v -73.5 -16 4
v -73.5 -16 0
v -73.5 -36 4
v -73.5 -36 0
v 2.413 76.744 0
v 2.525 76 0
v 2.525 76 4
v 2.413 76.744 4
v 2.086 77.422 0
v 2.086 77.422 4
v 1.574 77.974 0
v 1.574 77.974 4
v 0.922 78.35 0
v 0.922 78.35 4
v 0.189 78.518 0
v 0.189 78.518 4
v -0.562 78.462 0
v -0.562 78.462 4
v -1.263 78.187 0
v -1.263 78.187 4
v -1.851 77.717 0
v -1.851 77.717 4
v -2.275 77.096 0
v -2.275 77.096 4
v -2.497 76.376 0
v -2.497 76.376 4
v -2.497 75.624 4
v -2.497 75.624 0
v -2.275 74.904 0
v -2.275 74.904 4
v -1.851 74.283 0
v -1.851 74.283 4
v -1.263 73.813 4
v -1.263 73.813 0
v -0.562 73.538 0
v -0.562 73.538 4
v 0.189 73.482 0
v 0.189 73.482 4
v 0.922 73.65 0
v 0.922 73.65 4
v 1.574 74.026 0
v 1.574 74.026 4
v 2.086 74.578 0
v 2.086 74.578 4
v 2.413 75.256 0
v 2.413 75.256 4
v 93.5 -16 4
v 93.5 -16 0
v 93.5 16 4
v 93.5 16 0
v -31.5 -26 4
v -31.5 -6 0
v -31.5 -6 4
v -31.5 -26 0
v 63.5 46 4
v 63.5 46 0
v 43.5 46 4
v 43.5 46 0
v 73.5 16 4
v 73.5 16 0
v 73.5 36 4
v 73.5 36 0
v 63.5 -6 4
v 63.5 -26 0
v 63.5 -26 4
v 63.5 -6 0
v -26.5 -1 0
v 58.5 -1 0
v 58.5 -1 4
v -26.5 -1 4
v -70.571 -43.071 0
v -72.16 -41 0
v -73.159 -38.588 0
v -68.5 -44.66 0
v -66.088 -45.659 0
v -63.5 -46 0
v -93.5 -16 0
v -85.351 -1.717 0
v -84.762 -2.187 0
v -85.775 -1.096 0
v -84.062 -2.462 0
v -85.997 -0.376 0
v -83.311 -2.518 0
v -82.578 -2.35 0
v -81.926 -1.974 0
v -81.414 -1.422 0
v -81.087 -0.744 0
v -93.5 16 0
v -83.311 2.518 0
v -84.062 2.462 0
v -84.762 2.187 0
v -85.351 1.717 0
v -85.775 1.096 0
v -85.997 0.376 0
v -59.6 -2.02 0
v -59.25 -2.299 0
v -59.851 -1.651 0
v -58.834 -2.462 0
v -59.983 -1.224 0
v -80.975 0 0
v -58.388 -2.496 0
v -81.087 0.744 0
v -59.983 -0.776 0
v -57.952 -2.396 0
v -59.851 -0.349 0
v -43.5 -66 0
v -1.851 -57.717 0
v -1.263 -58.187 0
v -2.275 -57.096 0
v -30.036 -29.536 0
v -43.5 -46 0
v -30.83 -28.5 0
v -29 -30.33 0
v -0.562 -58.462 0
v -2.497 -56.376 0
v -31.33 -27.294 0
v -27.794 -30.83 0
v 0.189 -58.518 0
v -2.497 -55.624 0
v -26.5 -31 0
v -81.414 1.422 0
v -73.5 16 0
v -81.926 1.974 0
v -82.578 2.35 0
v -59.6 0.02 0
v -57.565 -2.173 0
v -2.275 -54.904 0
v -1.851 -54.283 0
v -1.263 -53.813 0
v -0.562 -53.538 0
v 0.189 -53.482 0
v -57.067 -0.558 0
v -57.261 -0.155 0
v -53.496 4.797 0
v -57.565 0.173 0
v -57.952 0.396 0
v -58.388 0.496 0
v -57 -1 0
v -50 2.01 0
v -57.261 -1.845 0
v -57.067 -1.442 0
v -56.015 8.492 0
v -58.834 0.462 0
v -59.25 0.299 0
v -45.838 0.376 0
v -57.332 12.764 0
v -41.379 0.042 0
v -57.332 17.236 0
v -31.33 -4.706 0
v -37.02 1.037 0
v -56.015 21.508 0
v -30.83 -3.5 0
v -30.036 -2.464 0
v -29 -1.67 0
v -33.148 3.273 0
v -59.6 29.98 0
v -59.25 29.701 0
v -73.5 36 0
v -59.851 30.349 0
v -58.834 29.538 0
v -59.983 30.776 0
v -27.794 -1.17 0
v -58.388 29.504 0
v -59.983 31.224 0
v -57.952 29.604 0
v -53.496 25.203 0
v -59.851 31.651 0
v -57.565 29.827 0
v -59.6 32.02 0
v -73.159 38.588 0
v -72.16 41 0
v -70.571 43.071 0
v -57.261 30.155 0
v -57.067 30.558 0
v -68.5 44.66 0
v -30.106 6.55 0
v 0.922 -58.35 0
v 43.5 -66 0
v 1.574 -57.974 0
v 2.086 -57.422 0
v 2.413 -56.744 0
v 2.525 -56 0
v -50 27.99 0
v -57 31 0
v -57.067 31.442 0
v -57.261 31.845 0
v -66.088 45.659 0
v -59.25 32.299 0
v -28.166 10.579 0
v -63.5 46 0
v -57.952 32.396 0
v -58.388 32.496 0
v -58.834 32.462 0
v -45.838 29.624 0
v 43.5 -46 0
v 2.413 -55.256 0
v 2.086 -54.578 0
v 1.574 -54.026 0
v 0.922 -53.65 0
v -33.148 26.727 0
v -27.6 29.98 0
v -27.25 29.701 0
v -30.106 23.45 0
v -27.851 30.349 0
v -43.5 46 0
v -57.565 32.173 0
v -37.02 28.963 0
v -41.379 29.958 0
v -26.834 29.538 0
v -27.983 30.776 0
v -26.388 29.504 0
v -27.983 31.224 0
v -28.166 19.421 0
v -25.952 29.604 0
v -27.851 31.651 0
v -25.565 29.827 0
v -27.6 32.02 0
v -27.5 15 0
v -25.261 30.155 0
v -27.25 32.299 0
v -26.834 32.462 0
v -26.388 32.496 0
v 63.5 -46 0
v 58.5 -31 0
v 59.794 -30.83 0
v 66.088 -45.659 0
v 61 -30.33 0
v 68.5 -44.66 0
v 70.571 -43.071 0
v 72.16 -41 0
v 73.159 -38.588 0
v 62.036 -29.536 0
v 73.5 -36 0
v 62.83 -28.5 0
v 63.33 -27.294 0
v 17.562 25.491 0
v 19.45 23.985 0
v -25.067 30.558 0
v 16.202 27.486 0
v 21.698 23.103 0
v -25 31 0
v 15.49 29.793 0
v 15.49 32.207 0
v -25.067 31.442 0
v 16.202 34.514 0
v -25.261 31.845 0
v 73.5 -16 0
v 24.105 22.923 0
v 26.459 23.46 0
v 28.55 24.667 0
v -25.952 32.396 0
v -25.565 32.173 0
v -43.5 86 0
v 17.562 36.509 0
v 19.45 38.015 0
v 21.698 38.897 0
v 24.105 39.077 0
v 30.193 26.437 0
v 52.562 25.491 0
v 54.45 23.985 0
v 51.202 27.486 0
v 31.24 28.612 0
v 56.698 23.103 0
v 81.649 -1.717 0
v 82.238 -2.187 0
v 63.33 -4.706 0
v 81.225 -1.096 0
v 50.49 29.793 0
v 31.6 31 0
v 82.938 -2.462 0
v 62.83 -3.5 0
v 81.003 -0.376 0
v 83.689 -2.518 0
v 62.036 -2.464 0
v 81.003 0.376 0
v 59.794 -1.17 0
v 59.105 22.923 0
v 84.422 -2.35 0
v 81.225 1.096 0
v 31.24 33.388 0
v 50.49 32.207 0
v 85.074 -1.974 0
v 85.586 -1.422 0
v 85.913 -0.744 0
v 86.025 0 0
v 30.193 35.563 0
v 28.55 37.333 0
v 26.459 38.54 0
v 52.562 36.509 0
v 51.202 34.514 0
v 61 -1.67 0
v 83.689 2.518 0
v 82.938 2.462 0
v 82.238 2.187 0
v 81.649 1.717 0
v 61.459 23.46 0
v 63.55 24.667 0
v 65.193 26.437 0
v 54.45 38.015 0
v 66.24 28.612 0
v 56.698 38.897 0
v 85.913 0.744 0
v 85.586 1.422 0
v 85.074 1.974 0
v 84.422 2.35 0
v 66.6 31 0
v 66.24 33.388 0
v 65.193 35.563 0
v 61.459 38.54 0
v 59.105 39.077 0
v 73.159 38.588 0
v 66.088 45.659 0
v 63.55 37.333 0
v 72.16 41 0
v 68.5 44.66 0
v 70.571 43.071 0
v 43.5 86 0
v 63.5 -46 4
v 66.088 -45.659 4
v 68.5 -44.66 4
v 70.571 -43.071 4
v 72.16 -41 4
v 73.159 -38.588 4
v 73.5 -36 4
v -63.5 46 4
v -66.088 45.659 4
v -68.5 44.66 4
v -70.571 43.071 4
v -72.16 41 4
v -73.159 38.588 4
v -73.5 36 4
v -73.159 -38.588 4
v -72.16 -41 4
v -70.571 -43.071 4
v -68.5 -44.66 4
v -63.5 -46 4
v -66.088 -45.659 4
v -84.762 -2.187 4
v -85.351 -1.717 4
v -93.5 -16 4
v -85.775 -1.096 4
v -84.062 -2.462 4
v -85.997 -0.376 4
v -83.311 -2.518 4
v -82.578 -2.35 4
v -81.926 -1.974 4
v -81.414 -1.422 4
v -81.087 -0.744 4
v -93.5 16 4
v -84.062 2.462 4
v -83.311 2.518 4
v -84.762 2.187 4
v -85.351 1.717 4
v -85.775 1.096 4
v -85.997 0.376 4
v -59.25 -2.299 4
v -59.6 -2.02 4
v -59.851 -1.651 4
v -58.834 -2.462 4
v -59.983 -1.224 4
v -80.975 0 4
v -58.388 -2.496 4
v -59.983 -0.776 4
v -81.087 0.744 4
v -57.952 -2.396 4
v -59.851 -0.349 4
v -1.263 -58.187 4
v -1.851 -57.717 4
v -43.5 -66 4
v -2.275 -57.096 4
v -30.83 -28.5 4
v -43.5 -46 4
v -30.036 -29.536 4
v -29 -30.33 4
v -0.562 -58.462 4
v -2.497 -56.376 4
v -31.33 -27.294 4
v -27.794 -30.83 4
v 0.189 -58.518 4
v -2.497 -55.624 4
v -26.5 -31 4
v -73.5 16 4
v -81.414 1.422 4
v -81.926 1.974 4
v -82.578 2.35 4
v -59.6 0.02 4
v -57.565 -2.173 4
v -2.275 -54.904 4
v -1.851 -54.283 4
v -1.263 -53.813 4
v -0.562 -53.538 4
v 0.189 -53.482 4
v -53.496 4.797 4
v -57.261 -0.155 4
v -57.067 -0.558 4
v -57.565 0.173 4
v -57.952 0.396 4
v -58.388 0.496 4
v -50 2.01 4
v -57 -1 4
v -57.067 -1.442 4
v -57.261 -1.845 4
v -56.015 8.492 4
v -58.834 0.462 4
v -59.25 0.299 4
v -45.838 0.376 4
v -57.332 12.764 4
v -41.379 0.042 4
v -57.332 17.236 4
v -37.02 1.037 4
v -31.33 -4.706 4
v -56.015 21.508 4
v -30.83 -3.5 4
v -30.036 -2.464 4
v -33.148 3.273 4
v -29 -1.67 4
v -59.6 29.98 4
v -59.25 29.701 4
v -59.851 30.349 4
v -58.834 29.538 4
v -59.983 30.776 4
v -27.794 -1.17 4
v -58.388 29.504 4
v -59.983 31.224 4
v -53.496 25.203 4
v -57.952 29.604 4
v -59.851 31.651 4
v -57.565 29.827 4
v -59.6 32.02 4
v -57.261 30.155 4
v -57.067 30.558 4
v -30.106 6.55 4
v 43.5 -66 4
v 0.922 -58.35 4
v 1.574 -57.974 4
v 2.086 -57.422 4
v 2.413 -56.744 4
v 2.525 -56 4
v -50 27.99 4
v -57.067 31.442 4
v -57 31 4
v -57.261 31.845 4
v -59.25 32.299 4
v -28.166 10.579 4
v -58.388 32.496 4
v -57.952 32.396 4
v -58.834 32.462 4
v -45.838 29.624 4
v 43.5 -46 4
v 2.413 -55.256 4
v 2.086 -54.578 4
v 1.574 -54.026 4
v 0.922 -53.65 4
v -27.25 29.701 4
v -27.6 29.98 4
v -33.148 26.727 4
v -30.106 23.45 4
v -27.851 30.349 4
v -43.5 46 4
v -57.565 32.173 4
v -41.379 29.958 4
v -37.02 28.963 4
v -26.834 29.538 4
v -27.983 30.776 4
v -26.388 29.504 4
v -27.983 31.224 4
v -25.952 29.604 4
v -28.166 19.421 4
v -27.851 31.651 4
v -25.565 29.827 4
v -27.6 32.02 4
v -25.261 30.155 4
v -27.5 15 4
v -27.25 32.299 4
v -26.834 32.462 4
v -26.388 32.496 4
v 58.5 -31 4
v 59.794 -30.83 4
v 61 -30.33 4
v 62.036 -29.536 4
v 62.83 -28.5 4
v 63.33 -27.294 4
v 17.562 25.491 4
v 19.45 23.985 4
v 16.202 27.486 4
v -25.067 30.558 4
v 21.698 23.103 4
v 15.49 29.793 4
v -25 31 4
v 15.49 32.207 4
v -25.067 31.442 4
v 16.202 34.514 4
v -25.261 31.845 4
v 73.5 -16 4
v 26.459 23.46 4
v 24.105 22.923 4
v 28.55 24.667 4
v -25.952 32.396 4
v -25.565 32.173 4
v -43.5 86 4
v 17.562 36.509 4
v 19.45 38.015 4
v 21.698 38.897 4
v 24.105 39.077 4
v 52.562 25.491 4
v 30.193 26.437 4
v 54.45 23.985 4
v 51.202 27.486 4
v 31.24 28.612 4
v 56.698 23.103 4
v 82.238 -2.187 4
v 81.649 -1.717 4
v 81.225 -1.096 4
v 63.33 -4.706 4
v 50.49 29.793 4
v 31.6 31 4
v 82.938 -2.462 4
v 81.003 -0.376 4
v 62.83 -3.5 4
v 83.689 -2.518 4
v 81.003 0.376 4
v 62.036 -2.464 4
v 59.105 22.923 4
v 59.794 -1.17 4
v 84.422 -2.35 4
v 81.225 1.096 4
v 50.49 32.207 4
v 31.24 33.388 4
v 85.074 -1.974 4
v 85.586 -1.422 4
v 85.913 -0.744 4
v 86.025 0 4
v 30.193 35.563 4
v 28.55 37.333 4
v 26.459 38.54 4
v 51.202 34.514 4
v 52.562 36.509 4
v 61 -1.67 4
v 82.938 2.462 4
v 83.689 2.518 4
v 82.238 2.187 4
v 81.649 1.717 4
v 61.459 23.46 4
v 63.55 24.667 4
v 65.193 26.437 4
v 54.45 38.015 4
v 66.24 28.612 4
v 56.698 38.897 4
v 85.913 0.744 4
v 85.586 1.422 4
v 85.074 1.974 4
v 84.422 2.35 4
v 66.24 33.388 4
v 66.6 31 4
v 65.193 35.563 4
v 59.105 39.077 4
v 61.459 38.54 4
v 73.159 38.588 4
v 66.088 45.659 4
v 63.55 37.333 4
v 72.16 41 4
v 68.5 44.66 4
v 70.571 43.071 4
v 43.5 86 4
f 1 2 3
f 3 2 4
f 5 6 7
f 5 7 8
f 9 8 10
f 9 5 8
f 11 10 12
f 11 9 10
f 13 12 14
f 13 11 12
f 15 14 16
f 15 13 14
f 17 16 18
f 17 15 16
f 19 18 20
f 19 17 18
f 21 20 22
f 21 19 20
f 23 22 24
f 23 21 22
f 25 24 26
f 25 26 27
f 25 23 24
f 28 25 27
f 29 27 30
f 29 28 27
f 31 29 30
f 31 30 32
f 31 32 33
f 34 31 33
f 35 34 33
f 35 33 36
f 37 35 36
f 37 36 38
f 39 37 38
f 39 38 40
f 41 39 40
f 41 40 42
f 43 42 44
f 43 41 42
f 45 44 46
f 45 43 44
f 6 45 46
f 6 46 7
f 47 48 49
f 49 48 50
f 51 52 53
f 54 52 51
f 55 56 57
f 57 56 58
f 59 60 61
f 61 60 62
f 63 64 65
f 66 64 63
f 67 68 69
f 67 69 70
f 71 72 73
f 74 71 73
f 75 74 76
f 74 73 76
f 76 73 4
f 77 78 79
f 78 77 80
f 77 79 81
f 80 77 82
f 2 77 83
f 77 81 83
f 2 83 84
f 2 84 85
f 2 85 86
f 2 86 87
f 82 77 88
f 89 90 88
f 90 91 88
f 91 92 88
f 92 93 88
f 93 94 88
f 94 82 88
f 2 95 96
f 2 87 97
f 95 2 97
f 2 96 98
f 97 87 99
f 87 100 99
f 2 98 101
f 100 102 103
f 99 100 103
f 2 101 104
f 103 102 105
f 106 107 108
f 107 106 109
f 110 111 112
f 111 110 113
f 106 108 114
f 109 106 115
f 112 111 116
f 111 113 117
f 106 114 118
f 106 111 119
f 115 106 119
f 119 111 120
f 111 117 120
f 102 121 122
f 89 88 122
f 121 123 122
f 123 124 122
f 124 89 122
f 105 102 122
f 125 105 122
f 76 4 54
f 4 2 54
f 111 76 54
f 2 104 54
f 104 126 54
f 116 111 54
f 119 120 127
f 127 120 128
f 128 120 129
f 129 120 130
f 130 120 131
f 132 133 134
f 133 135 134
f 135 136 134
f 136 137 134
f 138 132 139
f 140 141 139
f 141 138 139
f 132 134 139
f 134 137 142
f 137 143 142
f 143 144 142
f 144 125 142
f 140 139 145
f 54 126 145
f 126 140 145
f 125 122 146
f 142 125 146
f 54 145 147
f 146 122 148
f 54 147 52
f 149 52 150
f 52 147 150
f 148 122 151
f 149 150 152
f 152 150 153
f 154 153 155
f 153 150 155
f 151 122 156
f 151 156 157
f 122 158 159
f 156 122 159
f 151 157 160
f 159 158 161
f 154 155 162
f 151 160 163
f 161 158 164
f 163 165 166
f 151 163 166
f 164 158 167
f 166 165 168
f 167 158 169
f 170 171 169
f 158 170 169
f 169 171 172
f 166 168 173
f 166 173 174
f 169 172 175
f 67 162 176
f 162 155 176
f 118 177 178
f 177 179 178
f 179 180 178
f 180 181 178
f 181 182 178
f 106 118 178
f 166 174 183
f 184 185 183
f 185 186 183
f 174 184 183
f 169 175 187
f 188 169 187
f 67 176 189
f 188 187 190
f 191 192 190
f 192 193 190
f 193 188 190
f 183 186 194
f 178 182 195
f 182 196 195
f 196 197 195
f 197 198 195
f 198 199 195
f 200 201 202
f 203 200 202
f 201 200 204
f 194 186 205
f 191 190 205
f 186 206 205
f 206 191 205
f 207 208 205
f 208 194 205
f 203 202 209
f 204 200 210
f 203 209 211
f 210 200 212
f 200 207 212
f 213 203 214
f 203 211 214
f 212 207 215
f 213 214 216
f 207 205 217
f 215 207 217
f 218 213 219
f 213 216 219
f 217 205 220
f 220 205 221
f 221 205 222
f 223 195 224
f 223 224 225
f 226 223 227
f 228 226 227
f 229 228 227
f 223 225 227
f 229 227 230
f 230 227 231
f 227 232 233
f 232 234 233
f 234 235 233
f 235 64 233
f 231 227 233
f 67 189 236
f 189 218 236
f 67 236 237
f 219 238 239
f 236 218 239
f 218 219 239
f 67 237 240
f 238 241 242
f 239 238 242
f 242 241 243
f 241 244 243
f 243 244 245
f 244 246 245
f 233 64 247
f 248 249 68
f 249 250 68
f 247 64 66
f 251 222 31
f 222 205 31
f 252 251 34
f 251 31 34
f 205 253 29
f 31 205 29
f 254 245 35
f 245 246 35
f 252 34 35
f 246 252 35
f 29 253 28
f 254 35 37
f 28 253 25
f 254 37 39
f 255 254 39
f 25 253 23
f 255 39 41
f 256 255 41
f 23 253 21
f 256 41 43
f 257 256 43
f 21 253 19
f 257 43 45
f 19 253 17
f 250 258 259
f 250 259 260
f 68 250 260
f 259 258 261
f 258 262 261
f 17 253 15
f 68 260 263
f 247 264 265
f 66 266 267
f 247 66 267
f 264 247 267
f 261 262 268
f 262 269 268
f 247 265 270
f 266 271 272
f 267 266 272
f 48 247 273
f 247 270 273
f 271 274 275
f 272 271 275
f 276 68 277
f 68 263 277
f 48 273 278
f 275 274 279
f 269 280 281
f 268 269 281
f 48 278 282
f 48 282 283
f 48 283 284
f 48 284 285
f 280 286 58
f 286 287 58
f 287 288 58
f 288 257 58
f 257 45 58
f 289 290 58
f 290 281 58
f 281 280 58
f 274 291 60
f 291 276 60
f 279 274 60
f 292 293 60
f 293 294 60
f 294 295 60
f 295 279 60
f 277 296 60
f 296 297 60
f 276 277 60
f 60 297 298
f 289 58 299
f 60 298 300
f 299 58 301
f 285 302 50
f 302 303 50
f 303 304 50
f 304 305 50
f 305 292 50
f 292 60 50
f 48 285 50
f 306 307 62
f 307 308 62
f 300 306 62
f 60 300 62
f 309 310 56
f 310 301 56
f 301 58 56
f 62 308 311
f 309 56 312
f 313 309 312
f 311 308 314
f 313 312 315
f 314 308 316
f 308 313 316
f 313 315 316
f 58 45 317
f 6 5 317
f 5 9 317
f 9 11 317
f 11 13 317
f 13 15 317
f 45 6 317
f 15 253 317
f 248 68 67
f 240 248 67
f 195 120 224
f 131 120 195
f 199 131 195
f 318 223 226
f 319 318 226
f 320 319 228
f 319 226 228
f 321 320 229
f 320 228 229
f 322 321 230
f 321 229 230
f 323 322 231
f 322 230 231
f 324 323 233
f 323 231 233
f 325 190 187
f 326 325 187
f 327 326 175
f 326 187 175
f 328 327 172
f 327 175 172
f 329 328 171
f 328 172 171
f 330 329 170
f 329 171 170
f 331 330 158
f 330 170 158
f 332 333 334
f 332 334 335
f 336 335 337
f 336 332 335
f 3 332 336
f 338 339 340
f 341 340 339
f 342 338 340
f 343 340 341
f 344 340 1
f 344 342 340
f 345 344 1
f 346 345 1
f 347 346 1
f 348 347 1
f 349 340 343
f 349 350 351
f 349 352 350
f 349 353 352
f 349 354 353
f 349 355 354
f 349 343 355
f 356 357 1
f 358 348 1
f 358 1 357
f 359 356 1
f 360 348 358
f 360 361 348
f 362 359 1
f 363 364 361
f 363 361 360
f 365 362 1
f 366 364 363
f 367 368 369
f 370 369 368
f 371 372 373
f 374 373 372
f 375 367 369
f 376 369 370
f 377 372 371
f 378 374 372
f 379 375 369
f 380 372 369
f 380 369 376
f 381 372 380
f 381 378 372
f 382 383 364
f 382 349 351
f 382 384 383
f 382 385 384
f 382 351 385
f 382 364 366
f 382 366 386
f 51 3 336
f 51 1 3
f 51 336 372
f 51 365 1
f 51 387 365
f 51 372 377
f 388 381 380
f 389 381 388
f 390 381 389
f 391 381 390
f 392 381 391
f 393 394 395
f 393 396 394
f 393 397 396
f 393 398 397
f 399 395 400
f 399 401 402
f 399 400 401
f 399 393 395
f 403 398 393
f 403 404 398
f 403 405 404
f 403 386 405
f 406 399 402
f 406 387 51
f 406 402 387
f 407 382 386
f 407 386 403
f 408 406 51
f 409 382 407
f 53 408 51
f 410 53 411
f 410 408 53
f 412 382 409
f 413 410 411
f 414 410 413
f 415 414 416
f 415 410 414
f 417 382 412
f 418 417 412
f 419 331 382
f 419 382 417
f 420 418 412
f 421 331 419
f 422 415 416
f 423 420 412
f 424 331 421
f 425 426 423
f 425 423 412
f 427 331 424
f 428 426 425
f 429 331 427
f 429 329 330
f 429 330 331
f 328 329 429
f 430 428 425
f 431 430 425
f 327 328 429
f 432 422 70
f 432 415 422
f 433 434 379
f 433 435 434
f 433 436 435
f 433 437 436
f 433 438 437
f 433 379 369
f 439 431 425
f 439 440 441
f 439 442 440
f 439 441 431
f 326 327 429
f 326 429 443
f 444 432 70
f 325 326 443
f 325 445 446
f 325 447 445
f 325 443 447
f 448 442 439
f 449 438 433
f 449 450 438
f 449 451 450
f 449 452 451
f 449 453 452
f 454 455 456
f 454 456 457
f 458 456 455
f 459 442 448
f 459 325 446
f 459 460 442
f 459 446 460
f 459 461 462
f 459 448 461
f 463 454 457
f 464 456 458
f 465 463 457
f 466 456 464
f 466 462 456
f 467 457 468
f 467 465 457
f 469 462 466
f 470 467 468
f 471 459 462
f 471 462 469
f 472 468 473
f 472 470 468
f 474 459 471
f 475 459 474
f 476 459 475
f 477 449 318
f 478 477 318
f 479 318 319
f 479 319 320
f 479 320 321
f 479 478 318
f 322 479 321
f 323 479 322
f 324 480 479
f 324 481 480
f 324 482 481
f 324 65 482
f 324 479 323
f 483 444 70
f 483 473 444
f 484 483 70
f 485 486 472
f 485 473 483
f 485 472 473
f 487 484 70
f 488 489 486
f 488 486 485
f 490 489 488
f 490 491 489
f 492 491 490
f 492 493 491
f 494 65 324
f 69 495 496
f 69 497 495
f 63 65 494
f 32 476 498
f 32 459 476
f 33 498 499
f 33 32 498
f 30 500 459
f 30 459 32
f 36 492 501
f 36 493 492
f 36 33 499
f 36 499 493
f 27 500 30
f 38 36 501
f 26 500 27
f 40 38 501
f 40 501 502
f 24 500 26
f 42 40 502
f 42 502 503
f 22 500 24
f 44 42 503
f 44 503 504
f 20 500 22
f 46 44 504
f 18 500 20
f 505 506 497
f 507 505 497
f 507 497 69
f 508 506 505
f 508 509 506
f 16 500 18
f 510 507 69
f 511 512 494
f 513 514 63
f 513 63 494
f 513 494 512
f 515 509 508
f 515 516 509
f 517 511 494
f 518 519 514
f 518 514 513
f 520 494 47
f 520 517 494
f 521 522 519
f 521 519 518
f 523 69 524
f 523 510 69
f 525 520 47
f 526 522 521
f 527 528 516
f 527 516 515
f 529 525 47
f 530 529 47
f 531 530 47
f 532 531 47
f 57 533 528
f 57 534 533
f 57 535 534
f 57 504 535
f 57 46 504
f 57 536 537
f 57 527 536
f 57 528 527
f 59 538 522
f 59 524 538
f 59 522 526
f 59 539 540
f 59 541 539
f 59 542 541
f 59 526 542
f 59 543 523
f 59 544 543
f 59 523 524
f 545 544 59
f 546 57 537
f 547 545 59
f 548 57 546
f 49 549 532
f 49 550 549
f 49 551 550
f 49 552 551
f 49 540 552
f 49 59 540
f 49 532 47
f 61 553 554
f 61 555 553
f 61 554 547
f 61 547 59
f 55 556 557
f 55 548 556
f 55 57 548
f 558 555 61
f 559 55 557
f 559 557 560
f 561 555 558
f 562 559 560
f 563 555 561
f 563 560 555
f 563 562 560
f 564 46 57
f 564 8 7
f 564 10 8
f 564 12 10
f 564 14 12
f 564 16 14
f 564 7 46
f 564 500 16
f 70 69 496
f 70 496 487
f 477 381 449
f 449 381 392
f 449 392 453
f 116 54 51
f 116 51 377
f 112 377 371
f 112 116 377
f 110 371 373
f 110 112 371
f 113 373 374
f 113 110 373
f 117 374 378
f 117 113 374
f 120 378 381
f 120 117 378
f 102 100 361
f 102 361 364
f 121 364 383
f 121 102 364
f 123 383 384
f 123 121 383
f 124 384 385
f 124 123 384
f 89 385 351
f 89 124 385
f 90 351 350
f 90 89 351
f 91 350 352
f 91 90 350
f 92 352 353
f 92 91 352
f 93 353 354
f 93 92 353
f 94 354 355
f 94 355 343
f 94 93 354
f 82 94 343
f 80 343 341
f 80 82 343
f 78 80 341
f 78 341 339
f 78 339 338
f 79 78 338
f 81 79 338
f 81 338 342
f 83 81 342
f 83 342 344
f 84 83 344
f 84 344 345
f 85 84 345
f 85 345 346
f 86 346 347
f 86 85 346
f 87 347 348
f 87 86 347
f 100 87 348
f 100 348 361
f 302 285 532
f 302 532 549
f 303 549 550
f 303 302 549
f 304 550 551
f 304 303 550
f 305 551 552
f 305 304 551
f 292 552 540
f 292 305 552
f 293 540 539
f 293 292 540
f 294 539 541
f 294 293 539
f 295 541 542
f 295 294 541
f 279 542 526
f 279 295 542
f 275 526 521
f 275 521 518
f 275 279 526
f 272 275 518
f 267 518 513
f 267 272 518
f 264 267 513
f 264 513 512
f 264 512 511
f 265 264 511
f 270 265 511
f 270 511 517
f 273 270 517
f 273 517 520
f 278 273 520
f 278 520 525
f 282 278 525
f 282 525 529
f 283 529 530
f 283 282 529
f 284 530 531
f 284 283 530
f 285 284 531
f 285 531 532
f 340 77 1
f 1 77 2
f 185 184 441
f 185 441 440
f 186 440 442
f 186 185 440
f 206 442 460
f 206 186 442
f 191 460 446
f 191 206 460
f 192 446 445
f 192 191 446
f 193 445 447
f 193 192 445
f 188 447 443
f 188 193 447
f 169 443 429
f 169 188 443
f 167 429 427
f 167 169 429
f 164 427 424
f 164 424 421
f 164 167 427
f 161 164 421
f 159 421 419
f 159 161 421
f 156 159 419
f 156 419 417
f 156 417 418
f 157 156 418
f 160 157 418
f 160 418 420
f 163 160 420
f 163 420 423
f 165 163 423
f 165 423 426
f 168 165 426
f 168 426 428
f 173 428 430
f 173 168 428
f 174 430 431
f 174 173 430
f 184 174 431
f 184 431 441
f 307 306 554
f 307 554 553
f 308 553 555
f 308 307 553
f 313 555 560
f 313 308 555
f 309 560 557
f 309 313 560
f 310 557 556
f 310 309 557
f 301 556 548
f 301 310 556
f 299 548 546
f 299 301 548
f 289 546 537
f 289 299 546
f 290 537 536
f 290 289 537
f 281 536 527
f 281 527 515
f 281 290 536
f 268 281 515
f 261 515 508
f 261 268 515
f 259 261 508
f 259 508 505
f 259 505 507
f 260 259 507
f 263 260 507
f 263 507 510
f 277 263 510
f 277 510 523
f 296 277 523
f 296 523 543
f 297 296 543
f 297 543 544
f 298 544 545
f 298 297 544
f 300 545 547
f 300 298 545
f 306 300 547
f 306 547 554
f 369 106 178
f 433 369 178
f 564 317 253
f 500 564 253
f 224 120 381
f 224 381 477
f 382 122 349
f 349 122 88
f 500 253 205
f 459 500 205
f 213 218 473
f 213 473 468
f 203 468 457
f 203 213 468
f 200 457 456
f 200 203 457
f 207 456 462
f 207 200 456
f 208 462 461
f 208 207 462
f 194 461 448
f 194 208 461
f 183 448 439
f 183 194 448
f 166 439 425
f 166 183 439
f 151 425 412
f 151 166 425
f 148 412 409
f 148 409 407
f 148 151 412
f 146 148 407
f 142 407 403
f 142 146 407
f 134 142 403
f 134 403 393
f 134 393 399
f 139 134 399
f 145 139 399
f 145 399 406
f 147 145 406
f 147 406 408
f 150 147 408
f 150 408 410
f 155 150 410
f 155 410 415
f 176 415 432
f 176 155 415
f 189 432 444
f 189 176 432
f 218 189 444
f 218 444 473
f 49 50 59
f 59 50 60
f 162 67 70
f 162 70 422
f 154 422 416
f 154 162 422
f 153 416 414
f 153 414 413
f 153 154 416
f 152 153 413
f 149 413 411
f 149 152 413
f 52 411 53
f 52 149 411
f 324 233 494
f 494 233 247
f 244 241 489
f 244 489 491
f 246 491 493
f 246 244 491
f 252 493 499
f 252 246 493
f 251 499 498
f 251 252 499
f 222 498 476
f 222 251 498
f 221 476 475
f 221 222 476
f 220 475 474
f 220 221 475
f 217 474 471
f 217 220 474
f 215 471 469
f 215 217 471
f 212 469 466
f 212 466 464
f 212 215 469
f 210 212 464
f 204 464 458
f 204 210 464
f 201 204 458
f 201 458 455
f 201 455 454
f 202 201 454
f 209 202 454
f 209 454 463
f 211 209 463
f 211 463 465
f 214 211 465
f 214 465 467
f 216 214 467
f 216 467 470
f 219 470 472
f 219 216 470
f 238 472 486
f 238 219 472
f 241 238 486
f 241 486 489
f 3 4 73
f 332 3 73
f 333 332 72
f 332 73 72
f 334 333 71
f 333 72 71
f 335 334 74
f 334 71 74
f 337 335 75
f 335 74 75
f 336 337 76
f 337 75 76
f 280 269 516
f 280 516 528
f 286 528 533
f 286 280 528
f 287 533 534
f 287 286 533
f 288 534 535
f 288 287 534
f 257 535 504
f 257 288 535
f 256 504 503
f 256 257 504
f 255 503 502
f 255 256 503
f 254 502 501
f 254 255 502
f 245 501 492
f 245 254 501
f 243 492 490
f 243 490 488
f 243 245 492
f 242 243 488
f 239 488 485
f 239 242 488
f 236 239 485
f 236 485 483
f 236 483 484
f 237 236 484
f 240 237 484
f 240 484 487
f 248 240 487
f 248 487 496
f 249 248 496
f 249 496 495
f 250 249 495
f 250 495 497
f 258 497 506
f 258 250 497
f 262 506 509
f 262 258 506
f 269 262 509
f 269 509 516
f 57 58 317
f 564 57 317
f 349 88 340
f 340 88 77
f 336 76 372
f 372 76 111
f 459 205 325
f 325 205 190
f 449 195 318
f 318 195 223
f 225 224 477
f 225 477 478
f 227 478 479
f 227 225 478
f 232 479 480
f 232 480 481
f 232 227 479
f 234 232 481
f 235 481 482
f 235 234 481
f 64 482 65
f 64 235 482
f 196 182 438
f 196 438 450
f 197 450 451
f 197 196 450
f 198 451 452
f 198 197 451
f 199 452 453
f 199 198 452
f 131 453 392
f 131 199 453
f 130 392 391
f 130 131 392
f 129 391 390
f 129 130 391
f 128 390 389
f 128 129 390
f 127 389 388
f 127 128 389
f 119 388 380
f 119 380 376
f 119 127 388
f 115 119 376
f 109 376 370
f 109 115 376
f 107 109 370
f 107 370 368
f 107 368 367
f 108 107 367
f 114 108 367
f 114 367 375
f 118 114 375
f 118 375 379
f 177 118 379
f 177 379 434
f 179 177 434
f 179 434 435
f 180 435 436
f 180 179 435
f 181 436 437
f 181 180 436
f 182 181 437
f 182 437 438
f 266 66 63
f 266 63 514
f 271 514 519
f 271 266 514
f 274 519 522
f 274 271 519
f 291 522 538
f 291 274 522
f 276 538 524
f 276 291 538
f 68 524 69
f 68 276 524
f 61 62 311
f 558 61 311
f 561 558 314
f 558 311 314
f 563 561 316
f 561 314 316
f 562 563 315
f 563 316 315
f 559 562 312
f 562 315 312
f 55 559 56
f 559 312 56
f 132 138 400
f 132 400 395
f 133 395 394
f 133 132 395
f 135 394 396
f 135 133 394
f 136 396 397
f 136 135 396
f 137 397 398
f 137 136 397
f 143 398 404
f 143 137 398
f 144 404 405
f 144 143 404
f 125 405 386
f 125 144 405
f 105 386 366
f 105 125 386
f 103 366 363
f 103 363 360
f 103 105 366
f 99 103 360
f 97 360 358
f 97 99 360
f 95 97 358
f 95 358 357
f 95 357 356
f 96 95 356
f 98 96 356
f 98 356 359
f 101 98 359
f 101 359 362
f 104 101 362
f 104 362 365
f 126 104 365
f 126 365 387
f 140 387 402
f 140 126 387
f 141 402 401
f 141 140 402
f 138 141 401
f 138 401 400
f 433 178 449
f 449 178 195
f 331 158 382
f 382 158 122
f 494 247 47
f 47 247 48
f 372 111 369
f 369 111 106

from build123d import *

# Parameters (mm, degrees)
MODEL_R             = 8.1
MODEL_R_2           = 1.5
MODEL_R_3           = 2.525
MODEL_R_4           = 15
BOSS_EXTRUDE1_DEPTH = 4


with BuildPart() as part:
    # Model → Boss-Extrude1 (new body)
    with BuildSketch(Plane.XY):
        with BuildLine():
            Line((-93.5, -16), (-73.5, -16))
            Line((-73.5, -16), (-73.5, -36))
            ThreePointArc((-73.5, -36), (-70.571067812, -43.071067812), (-63.5, -46))
            Line((-63.5, -46), (-43.5, -46))
            Line((-43.5, -46), (-43.5, -66))
            Line((-43.5, -66), (43.5, -66))
            Line((43.5, -66), (43.5, -46))
            Line((43.5, -46), (63.5, -46))
            ThreePointArc((63.5, -46), (70.571067812, -43.071067812), (73.5, -36))
            Line((73.5, -36), (73.5, -16))
            Line((73.5, -16), (93.5, -16))
            Line((93.5, -16), (93.5, 16))
            Line((93.5, 16), (73.5, 16))
            Line((73.5, 16), (73.5, 36))
            ThreePointArc((73.5, 36), (70.571067812, 43.071067812), (63.5, 46))
            Line((63.5, 46), (43.5, 46))
            Line((43.5, 46), (43.5, 86))
            Line((43.5, 86), (-43.5, 86))
            Line((-43.5, 86), (-43.5, 46))
            Line((-43.5, 46), (-63.5, 46))
            ThreePointArc((-63.5, 46), (-70.571067812, 43.071067812), (-73.5, 36))
            Line((-73.5, 36), (-73.5, 16))
            Line((-73.5, 16), (-93.5, 16))
            Line((-93.5, 16), (-93.5, -16))
        make_face()
        with Locations((23.5, 31)):
            Circle(MODEL_R, mode=Mode.SUBTRACT)
        with Locations((-26.5, 31)):
            Circle(MODEL_R_2, mode=Mode.SUBTRACT)
        with Locations((-58.5, 31)):
            Circle(MODEL_R_2, mode=Mode.SUBTRACT)
        with Locations((83.5, 0)):
            Circle(MODEL_R_3, mode=Mode.SUBTRACT)
        with Locations((0, 76)):
            Circle(MODEL_R_3, mode=Mode.SUBTRACT)
        with Locations((-83.5, 0)):
            Circle(MODEL_R_3, mode=Mode.SUBTRACT)
        with Locations((0, -56)):
            Circle(MODEL_R_3, mode=Mode.SUBTRACT)
        with Locations((-58.5, -1)):
            Circle(MODEL_R_2, mode=Mode.SUBTRACT)
        with Locations((58.5, 31)):
            Circle(MODEL_R, mode=Mode.SUBTRACT)
        with Locations((-42.5, 15)):
            Circle(MODEL_R_4, mode=Mode.SUBTRACT)
        with BuildLine():
            Line((58.5, -1), (-26.5, -1))
            ThreePointArc((-26.5, -1), (-30.035533906, -2.464466094), (-31.5, -6))
            Line((-31.5, -6), (-31.5, -26))
            ThreePointArc((-31.5, -26), (-30.035533906, -29.535533906), (-26.5, -31))
            Line((-26.5, -31), (58.5, -31))
            ThreePointArc((58.5, -31), (62.035533906, -29.535533906), (63.5, -26))
            Line((63.5, -26), (63.5, -6))
            ThreePointArc((63.5, -6), (62.035533906, -2.464466094), (58.5, -1))
        make_face(mode=Mode.SUBTRACT)
    extrude(amount=BOSS_EXTRUDE1_DEPTH)


solid = part.part
